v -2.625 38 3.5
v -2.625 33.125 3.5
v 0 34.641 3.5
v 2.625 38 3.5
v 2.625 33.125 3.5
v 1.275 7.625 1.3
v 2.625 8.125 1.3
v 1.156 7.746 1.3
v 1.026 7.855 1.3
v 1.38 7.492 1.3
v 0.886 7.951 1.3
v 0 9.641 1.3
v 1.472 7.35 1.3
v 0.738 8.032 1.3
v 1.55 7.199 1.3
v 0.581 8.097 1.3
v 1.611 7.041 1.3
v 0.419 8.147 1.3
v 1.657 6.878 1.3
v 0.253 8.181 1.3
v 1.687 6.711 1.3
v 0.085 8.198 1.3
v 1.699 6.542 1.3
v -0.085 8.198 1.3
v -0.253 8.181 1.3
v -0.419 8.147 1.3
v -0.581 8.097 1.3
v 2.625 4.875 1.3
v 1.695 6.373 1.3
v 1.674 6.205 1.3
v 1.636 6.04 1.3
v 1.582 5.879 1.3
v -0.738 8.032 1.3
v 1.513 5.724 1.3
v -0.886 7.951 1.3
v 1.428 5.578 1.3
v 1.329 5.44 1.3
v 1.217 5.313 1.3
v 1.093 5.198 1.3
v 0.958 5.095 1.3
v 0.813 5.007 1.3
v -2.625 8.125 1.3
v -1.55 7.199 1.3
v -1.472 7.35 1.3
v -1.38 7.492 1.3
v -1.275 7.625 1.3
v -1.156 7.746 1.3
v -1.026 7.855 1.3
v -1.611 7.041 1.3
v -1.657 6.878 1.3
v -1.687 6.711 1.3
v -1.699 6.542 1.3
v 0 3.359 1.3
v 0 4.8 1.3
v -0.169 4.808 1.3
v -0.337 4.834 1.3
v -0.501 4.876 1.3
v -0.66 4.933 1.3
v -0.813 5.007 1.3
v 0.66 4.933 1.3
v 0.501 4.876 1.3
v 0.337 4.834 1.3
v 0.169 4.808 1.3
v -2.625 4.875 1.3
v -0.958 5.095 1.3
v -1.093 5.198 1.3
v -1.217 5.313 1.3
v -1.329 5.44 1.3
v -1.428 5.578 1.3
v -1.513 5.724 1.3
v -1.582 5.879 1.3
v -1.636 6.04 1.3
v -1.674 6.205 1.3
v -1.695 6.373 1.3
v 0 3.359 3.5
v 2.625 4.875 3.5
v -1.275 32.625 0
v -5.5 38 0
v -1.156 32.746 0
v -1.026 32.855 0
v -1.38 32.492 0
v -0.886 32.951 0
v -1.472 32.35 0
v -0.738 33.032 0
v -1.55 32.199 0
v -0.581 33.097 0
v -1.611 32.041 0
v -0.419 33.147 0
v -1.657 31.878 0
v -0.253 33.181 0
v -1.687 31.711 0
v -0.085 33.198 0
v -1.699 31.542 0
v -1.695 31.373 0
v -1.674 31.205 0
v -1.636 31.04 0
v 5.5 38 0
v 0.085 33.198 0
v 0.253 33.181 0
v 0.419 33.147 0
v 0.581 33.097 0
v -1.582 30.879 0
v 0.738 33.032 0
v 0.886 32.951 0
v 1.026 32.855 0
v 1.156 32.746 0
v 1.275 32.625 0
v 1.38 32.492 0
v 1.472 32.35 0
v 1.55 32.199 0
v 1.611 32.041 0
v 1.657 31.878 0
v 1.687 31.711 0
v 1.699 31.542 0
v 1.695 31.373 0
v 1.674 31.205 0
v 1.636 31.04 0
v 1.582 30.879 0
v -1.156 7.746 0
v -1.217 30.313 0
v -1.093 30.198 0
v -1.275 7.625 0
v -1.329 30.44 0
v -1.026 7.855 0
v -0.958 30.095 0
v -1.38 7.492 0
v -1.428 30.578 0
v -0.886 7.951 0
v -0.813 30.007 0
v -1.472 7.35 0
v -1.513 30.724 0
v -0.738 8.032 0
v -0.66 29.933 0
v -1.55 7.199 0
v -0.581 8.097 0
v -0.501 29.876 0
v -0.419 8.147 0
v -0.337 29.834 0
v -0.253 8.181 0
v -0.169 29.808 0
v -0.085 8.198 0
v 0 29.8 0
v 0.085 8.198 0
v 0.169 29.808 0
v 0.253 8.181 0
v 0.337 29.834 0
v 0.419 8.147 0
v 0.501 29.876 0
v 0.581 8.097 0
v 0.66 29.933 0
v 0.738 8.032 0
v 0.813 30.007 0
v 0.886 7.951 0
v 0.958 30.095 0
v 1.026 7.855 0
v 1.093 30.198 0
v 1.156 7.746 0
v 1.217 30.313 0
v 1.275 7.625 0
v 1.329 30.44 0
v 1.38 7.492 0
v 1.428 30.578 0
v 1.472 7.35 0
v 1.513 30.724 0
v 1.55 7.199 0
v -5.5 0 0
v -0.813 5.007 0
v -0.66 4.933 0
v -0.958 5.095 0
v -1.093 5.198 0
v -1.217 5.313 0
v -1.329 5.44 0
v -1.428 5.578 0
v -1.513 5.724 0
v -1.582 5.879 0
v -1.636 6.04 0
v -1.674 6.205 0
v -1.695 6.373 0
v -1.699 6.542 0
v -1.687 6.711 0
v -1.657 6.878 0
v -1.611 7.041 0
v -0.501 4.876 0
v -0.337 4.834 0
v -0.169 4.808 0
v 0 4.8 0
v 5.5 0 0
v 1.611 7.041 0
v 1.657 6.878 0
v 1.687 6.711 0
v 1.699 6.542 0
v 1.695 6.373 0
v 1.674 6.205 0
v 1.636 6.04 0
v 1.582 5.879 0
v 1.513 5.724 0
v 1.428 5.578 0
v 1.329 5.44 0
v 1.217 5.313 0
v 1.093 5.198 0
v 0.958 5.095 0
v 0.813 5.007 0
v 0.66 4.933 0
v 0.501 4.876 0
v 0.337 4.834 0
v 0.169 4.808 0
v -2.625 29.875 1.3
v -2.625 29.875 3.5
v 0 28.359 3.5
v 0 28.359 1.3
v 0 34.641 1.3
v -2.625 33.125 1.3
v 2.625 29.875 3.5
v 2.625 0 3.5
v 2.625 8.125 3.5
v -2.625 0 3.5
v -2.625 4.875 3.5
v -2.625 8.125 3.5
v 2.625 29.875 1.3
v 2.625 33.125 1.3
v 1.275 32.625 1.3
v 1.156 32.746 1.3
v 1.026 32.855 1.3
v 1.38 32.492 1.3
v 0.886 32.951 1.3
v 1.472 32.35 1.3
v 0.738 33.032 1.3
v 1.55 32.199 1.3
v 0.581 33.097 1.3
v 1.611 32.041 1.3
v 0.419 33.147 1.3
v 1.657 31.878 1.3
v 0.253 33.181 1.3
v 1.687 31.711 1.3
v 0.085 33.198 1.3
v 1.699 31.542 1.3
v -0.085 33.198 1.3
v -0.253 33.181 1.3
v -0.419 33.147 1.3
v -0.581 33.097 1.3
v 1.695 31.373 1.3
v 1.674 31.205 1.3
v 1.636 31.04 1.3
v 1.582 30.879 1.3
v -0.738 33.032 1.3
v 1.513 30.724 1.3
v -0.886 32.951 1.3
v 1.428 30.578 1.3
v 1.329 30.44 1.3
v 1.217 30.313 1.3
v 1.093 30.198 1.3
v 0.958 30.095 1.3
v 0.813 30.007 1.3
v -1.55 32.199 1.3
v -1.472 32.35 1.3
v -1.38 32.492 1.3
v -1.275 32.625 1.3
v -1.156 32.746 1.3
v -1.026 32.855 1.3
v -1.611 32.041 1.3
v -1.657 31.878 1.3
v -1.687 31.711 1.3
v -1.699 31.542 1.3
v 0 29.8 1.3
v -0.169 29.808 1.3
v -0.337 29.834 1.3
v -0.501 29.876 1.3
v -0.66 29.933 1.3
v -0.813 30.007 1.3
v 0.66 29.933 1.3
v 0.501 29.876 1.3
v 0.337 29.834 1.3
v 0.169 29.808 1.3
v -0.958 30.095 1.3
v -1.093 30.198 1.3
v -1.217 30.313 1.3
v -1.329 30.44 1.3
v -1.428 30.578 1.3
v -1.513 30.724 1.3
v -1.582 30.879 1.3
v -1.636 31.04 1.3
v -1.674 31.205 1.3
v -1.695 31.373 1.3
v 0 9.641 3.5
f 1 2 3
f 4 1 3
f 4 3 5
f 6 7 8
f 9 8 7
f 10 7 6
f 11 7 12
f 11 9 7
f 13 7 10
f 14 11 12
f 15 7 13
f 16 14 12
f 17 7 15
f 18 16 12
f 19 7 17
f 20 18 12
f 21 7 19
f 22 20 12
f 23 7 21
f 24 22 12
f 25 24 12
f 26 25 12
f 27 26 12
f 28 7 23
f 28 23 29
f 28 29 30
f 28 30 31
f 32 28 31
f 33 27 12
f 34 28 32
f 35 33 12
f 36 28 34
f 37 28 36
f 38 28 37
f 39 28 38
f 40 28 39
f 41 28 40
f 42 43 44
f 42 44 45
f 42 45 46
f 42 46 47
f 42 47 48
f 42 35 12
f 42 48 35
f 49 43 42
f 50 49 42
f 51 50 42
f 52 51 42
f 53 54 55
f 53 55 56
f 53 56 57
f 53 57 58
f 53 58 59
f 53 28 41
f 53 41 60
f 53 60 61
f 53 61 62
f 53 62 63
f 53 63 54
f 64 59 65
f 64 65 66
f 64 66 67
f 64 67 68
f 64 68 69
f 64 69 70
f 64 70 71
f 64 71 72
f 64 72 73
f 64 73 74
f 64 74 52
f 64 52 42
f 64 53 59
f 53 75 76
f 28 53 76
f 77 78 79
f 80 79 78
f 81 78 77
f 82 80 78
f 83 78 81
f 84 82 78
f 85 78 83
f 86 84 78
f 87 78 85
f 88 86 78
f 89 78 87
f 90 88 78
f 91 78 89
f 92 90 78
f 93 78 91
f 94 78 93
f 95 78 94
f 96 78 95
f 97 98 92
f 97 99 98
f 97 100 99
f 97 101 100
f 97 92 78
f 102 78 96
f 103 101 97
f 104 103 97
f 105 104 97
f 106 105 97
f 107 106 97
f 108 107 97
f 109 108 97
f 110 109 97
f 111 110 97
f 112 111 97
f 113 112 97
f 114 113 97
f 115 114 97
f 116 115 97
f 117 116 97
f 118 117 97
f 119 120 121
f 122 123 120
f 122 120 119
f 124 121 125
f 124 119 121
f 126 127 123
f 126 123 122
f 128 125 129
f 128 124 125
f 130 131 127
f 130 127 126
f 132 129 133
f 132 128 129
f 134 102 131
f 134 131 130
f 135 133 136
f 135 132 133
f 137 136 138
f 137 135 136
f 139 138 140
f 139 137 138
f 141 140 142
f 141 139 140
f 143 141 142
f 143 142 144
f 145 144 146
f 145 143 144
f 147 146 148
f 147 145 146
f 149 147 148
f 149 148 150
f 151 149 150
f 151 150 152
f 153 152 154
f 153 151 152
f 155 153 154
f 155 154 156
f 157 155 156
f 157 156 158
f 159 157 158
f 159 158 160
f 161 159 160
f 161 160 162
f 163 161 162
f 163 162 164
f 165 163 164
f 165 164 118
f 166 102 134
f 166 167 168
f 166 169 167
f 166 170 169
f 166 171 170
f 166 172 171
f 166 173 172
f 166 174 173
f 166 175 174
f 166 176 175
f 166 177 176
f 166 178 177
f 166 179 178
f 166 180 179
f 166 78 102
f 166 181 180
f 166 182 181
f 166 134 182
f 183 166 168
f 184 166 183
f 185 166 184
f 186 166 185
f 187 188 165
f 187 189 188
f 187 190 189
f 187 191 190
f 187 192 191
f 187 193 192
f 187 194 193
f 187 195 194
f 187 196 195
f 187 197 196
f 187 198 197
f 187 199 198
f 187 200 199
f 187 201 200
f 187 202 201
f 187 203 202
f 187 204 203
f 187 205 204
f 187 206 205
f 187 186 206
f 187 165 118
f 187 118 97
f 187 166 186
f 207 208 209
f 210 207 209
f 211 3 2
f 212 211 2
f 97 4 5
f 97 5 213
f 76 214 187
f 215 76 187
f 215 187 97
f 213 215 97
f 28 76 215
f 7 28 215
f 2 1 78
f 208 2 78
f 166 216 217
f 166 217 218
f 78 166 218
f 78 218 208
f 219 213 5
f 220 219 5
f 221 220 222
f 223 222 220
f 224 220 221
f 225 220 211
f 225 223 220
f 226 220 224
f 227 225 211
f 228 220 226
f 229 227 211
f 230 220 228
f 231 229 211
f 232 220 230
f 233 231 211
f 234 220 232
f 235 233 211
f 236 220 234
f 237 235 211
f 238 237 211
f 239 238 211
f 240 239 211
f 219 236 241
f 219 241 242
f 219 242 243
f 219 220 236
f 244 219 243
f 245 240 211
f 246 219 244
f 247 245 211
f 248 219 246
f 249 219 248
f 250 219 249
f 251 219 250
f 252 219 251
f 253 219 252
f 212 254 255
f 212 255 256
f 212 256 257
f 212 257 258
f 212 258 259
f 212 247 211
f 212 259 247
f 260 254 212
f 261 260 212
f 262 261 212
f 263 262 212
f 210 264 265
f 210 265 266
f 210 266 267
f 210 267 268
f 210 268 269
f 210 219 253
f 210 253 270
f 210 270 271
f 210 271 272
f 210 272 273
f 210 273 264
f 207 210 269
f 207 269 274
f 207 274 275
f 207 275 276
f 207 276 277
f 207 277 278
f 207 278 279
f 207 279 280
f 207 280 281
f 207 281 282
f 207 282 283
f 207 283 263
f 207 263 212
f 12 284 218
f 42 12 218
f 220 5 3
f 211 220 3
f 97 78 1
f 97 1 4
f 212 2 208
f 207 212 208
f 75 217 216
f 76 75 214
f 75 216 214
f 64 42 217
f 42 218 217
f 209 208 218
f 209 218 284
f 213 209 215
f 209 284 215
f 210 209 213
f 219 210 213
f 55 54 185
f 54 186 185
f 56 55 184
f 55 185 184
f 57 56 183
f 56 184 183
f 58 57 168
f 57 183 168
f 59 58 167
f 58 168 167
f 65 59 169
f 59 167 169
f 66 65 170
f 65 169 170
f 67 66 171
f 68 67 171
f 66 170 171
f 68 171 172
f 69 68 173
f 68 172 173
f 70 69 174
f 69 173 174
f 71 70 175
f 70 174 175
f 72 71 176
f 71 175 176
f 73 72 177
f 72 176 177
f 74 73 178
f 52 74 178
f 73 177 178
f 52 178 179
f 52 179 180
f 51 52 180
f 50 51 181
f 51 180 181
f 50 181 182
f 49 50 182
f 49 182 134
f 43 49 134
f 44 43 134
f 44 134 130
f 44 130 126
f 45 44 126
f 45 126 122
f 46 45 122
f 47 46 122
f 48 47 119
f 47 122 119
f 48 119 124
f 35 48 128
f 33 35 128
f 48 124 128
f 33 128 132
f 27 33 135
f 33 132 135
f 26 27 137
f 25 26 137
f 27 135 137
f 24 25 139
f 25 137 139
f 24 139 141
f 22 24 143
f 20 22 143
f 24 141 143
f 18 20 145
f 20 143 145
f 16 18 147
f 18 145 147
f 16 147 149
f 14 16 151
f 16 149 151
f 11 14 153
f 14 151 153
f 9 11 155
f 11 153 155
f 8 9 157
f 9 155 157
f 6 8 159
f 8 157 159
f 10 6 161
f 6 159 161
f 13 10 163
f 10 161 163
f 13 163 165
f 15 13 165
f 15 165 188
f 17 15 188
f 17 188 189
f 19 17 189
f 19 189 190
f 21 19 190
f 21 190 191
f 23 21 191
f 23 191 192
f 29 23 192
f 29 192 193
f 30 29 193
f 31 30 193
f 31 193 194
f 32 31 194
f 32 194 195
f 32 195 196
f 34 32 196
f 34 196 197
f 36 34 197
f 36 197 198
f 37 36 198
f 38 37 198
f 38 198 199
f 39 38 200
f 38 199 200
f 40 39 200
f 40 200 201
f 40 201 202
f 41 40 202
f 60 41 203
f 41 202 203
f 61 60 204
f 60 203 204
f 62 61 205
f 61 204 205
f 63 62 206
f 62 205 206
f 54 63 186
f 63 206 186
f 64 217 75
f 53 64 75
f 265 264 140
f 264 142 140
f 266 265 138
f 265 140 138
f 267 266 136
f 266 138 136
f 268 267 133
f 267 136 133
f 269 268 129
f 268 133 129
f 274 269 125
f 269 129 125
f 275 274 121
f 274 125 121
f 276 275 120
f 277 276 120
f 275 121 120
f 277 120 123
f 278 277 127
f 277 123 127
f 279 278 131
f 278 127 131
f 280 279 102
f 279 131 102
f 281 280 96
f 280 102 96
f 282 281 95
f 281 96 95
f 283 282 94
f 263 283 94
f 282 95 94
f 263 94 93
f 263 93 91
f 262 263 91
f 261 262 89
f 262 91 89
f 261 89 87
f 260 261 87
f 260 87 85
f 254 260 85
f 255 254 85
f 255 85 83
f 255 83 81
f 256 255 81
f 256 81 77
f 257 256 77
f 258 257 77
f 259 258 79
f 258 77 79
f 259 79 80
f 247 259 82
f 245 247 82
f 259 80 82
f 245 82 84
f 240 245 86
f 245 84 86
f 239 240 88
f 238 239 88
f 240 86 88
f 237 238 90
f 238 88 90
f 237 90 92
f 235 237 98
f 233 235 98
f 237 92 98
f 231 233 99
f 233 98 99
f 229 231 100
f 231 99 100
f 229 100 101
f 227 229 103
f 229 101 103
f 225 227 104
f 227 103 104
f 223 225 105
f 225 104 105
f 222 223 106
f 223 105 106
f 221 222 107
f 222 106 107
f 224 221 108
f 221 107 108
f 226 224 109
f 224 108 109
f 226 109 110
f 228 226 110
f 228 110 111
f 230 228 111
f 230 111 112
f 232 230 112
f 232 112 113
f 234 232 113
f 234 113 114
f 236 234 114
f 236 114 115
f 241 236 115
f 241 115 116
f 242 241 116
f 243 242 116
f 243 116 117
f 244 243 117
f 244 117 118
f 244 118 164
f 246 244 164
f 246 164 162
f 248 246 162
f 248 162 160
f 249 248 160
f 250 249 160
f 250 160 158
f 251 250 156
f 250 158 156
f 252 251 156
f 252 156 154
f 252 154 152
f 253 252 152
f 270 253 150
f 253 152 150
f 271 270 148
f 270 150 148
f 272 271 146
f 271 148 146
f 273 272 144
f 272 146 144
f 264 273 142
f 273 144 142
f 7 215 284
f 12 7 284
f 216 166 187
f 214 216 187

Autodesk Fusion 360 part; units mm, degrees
sketch "Sketch1" plane through (0, 0, 0) normal (0, 1, 0) x (1, 0, 0)
  line L0 (0, 0) -> (5.5, 0)
  line L1 (0, -3.5) -> (2.625, -3.5)
  line L2 (2.625, -3.5) -> (5.5, 0)
  line L3 (0, -1.75) -> (0, -22.5)
  line L4 (0, -3.5) -> (-2.625, -3.5)
  line L5 (-2.625, -3.5) -> (-5.5, 0)
  line L6 (0, 0) -> (-5.5, 0)
  dimension "d1" = 5.5
  dimension "d2" = 2.625
  dimension "d3" = 3.5
extrude "Extrude1" add sketch "Sketch1" along normal blind 38
sketch "Sketch2" plane through (0, 0, 3.5) normal (0, 0, 1) x (-1, 0, 0)
  line L0 (2.625, 0) -> (-2.625, 0)
  line L1 (-2.625, 0) -> (-2.625, -38)
  line L2 (-2.625, -38) -> (2.625, -38)
  line L3 (2.625, -38) -> (2.625, 0)
  line L4 (0, -38) -> (0, 0) construction
  line L5 (2.72, -29.9296) -> (0, -28.3592)
  line L6 (0, -28.3592) -> (-2.72, -29.9296)
  line L7 (-2.72, -29.9296) -> (-2.72, -33.0704)
  line L8 (-2.72, -33.0704) -> (0, -34.6408)
  line L9 (0, -34.6408) -> (2.72, -33.0704)
  line L10 (2.72, -33.0704) -> (2.72, -29.9296)
  line L11 (2.72, -4.9296) -> (0, -3.3592)
  line L12 (0, -3.3592) -> (-2.72, -4.9296)
  line L13 (-2.72, -4.9296) -> (-2.72, -8.0704)
  line L14 (-2.72, -8.0704) -> (0, -9.6408)
  line L15 (0, -9.6408) -> (2.72, -8.0704)
  line L16 (2.72, -8.0704) -> (2.72, -4.9296)
  point P0 (0, -31.5)
  point P1 (0, -6.5)
  dimension "d6" = 2.72
  dimension "d7" = 2.72
  dimension "d8" = 25
  dimension "d9" = 6.5
extrude "Extrude2" cut sketch "Sketch2" against normal blind 2.2 contours L1 L3 L11 L12 L14 L15 | L1 L3 L5 L6 L8 L9
hole "Hole1" at (0, 31.5, 3.5) at (0, 6.5, 3.5) direction (0, 0, -1) diameter 3.4 depth 16 tip angle 118
equation "d2 = ( 5.25 / 2 ) * 1 mm"
equation "d6 = ( 5.44 / 2 ) * 1 mm"
equation "d7 = ( 5.44 / 2 ) * 1 mm"
